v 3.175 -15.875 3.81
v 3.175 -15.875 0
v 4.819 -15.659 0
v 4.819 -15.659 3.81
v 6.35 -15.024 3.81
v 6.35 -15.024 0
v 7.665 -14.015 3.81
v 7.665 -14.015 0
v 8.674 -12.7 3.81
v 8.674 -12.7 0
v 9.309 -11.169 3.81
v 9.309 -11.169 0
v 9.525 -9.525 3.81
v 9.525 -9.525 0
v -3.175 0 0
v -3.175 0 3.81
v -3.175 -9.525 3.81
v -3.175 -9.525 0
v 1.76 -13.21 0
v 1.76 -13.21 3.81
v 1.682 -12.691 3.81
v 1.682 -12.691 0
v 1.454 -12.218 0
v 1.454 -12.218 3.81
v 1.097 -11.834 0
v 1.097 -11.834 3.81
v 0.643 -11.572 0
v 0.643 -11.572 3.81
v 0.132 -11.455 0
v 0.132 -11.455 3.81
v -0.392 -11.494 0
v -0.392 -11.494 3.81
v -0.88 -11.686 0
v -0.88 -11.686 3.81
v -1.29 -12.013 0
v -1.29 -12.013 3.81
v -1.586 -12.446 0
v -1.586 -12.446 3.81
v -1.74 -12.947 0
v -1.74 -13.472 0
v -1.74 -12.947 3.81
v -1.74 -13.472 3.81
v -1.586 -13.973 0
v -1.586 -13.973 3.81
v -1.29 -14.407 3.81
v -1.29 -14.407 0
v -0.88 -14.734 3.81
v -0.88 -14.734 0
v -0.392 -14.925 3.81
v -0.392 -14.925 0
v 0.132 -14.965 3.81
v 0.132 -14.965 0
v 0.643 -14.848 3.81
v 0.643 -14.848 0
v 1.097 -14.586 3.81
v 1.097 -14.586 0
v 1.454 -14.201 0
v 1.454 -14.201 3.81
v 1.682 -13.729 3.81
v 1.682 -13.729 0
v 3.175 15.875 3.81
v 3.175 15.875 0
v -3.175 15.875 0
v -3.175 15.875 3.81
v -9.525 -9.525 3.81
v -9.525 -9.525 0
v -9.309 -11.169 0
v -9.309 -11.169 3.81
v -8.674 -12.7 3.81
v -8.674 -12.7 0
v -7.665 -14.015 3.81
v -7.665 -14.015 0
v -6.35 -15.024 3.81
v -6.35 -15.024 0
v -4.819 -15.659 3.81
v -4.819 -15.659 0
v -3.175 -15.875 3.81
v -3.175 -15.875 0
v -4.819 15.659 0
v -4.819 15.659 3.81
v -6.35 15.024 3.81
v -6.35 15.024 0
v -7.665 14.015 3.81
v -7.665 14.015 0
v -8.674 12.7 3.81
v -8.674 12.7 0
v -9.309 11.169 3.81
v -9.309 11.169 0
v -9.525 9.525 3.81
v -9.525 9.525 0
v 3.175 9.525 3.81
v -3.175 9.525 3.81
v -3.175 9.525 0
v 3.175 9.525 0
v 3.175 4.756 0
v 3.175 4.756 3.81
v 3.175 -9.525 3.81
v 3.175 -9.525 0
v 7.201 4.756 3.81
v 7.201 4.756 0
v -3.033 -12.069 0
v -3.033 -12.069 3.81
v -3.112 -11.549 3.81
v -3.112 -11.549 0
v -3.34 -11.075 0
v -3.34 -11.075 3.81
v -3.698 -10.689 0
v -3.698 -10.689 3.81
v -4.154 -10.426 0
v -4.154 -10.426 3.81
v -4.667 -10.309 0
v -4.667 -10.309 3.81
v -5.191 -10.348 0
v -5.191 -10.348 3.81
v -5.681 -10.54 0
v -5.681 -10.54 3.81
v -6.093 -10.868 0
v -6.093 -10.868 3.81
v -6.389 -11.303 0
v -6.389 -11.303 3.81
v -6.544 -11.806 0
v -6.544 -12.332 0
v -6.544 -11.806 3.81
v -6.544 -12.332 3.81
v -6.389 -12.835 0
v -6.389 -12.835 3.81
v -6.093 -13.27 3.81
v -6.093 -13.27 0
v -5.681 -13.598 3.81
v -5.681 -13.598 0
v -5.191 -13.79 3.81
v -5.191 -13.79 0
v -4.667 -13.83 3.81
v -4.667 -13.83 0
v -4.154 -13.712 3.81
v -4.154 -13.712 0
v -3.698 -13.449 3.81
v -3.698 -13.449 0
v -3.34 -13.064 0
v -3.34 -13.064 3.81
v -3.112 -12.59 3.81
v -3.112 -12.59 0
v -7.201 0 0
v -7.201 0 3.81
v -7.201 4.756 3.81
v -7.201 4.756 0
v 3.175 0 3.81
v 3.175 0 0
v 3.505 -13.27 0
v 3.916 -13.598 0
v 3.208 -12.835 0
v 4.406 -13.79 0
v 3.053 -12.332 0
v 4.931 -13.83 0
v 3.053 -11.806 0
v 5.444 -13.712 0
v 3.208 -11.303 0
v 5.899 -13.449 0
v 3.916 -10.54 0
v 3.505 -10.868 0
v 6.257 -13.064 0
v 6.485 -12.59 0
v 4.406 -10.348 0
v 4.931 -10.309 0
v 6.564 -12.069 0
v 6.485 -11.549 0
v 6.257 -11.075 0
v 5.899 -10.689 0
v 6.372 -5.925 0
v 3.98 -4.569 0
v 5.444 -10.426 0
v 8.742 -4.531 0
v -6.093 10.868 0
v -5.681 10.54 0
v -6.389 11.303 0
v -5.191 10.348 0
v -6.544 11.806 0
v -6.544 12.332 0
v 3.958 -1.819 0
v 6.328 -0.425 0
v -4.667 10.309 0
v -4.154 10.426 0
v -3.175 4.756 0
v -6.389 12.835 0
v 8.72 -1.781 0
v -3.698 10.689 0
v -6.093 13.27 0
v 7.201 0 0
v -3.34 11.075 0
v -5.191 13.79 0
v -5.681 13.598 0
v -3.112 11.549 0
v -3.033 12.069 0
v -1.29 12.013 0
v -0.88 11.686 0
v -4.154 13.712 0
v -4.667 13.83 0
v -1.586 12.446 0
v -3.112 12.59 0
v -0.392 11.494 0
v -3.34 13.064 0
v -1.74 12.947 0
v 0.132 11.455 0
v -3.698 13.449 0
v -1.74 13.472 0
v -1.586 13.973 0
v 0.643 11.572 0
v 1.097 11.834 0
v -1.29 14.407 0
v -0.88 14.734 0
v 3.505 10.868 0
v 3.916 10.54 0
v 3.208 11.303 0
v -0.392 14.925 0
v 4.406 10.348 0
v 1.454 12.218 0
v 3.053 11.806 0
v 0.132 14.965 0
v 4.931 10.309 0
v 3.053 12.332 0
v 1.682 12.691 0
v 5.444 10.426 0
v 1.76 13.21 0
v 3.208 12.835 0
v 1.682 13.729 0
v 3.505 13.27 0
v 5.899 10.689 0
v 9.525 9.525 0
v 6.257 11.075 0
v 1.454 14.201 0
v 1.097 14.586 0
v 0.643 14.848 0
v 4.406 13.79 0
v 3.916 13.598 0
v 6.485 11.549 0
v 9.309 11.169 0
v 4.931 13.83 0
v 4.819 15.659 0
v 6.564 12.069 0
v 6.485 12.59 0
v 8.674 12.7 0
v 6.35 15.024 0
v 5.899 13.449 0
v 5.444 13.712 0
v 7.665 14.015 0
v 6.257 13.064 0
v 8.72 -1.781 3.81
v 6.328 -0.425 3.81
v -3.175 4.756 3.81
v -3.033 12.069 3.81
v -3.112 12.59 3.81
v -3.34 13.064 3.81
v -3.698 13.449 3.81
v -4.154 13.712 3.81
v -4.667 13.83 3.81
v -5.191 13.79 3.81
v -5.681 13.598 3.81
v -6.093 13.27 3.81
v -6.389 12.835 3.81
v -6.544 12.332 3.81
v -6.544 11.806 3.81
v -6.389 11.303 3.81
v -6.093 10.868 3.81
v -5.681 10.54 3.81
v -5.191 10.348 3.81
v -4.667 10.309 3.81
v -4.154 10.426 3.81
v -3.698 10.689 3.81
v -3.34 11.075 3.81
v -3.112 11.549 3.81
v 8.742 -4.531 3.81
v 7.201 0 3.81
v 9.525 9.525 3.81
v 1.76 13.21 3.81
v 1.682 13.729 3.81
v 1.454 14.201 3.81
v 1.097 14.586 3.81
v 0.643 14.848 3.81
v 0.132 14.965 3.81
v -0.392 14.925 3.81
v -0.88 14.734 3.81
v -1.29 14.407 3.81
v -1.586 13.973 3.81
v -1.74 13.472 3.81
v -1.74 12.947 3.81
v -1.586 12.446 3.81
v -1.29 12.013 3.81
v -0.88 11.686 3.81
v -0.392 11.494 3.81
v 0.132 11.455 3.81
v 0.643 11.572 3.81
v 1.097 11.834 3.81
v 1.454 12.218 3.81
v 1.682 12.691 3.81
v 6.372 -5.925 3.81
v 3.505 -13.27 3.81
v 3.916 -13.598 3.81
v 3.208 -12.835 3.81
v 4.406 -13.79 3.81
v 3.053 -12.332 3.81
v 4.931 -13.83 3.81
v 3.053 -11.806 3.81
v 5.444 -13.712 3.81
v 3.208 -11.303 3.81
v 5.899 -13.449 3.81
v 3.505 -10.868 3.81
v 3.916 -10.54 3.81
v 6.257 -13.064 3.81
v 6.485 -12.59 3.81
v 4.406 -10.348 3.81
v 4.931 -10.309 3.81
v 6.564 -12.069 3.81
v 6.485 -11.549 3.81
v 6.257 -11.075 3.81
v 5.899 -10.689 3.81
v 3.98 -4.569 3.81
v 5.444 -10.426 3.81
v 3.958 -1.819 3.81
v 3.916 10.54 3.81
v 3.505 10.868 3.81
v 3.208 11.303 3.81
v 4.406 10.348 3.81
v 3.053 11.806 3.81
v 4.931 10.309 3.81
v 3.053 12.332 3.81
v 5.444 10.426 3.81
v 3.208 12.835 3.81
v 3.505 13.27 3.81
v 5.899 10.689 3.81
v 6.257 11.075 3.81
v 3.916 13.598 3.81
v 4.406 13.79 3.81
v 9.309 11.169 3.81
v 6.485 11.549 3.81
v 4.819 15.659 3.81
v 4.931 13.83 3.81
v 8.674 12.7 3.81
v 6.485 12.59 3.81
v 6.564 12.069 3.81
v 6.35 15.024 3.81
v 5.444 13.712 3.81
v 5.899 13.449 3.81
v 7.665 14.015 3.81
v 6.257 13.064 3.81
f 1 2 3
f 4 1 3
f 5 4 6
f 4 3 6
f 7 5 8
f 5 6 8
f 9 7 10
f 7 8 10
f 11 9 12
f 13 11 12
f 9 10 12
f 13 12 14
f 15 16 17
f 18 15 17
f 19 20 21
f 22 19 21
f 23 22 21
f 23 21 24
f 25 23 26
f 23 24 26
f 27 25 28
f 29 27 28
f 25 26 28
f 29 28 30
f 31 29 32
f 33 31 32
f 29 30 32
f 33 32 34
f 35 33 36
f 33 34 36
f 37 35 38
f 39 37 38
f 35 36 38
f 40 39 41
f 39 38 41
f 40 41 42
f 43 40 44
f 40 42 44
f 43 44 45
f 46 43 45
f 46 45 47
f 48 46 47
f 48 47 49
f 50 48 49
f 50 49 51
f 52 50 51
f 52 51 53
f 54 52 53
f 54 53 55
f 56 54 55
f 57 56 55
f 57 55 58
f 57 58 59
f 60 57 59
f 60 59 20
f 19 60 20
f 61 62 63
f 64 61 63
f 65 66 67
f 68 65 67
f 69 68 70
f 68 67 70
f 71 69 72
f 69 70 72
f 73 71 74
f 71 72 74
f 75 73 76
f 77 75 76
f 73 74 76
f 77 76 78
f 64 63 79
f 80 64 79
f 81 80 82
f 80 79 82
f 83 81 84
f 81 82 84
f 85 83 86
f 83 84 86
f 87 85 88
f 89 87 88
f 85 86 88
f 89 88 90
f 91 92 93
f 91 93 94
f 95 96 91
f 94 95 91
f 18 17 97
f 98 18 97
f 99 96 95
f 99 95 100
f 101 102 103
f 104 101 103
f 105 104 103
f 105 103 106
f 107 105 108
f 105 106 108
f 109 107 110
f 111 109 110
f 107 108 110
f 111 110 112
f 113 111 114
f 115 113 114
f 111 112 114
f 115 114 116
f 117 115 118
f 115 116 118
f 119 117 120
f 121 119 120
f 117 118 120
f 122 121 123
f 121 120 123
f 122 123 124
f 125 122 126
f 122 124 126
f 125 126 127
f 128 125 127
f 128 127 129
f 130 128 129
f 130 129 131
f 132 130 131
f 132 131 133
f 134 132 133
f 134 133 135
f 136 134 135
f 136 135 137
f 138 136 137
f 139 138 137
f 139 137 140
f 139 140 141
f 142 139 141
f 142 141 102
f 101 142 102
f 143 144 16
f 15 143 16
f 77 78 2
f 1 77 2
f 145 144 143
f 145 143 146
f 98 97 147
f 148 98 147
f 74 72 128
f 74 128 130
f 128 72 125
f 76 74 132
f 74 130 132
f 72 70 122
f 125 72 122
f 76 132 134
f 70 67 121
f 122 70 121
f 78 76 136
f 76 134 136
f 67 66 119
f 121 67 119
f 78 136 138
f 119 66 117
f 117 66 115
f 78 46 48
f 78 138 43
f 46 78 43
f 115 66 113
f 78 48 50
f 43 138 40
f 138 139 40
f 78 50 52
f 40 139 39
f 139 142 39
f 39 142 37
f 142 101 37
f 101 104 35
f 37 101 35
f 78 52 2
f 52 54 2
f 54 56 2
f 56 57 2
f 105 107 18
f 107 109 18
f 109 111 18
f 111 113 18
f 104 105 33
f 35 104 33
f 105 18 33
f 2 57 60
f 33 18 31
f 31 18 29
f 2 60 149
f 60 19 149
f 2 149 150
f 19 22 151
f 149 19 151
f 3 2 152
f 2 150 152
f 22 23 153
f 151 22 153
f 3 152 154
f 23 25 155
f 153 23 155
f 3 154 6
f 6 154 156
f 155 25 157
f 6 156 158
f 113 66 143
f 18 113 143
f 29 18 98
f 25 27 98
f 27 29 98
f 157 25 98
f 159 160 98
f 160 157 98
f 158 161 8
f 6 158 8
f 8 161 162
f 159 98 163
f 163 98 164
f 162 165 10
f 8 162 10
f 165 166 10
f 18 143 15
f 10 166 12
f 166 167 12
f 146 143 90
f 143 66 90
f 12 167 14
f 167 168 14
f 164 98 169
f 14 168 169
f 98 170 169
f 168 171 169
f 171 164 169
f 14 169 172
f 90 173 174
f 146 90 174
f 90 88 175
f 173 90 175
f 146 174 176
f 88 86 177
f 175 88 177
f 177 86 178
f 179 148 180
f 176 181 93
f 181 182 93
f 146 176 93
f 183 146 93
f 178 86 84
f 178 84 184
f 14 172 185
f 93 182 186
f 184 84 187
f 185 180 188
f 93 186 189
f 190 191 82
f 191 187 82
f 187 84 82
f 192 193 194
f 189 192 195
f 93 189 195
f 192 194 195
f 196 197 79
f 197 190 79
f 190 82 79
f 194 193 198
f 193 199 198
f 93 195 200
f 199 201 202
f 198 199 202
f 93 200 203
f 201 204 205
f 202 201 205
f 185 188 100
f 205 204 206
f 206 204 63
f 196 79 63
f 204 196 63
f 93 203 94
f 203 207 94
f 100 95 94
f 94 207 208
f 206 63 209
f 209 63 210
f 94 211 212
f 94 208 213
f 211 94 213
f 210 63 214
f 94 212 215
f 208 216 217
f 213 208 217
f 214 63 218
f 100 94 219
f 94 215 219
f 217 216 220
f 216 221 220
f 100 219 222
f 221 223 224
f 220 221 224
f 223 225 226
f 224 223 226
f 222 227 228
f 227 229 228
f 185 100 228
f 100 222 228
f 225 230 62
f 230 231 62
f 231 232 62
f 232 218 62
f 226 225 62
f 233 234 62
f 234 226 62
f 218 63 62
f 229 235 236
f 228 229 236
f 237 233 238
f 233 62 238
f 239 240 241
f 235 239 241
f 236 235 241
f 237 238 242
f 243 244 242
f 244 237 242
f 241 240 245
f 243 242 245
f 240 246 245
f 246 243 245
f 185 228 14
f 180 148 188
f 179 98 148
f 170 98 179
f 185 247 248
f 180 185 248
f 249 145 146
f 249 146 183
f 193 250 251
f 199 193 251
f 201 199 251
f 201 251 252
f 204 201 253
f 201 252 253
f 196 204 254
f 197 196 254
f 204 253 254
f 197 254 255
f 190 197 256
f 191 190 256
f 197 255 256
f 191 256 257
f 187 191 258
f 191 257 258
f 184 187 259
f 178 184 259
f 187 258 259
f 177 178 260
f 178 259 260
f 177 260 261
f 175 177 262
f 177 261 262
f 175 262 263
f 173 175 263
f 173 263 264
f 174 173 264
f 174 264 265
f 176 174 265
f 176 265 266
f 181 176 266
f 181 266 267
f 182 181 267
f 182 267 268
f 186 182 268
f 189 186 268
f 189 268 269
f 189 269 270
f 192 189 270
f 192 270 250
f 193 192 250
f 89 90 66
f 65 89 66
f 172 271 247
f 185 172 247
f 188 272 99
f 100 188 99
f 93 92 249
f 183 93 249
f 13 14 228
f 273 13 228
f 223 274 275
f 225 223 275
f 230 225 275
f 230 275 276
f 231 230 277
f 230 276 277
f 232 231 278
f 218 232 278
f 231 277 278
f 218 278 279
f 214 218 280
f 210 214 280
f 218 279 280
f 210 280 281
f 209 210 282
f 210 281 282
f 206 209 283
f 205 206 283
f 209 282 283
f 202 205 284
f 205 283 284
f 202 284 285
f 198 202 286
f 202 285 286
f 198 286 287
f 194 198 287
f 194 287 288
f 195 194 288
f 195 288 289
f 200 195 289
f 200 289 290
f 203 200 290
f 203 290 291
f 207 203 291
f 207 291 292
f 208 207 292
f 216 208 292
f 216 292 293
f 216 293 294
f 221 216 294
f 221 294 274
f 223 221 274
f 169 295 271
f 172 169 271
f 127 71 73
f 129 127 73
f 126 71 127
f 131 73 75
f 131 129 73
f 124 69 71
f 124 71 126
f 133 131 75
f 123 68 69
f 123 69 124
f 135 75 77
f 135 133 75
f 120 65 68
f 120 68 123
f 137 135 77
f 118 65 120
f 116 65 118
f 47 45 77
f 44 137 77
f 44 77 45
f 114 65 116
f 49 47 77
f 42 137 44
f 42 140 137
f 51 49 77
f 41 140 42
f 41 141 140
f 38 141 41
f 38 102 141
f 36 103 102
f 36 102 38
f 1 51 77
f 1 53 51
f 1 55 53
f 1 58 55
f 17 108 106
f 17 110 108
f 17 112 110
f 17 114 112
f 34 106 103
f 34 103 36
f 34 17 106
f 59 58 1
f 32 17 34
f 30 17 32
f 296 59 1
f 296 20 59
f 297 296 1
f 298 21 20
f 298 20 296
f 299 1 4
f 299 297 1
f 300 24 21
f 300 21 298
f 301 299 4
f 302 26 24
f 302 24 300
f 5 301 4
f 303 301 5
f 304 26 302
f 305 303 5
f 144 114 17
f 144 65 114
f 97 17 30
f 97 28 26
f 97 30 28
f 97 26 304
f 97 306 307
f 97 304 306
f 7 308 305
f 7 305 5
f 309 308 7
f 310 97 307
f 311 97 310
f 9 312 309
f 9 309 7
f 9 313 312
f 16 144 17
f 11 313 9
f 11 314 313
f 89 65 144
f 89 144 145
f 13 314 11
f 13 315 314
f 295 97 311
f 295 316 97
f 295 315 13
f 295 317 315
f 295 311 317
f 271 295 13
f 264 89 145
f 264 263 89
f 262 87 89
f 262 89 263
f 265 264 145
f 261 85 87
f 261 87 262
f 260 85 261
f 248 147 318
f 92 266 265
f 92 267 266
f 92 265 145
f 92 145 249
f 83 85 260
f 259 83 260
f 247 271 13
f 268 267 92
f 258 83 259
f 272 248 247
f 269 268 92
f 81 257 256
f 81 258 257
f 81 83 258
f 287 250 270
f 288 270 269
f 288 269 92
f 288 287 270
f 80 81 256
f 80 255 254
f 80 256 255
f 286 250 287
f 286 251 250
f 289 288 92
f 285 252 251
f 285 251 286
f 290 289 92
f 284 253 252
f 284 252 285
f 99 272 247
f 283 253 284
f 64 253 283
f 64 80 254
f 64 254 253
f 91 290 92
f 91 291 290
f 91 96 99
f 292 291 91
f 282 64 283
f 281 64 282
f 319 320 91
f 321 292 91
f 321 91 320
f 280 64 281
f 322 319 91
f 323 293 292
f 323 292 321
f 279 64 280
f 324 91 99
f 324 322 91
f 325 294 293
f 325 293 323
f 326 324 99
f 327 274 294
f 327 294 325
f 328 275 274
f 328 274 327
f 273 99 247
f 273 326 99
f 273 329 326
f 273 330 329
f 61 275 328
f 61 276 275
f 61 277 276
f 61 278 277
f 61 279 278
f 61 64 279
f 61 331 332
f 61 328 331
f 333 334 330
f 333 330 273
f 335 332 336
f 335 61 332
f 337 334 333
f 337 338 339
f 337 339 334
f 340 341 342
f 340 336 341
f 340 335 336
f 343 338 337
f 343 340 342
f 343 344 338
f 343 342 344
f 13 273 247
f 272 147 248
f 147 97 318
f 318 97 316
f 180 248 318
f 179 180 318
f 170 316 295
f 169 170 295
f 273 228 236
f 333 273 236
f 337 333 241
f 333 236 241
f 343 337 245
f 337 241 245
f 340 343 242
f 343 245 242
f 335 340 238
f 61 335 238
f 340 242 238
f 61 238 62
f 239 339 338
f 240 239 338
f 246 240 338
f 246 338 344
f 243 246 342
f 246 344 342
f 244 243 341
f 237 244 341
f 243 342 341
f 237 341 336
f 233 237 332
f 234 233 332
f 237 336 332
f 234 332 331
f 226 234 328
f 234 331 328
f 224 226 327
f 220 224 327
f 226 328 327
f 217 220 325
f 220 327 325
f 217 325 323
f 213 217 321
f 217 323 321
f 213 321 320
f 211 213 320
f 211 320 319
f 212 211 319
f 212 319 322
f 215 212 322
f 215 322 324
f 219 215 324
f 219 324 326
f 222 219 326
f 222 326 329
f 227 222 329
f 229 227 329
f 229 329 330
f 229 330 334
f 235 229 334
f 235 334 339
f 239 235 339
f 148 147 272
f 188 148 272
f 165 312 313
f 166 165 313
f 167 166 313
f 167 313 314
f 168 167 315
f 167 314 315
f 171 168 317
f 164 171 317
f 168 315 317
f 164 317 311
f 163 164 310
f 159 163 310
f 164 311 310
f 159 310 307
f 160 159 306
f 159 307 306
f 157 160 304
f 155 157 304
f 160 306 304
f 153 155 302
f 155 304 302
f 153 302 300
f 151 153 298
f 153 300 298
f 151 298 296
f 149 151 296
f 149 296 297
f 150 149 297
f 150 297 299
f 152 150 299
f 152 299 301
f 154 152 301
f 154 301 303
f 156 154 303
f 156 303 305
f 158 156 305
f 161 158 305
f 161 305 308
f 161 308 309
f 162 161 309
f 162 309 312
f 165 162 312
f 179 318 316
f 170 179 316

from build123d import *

# Parameters (mm, degrees)
F1_DEPTH = 3.81
F2_W     = 6.35
F2_H     = 4.7692152426
F2_H_2   = 4.7557847574
F2_H_3   = 9.525
F2_W_2   = 4.0261267766
F3_DEPTH = 25.4
F4_R     = 1.7598288085
F4_R_2   = 1.7653
F5_DEPTH = 25.4
F7_DEPTH = 25.4


with BuildPart() as f1:
    # F0 (on Top) → F1 (new body)
    with BuildSketch(Plane.XY):
        with BuildLine():
            Line((-3.175, -15.875), (3.175, -15.875))
            ThreePointArc((3.175, -15.875), (7.6651280605, -14.0151280605), (9.525, -9.525))
            Line((9.525, -9.525), (9.525, 9.525))
            ThreePointArc((9.525, 9.525), (7.6651280605, 14.0151280605), (3.175, 15.875))
            Line((3.175, 15.875), (-3.175, 15.875))
            ThreePointArc((-3.175, 15.875), (-7.6651280605, 14.0151280605), (-9.525, 9.525))
            Line((-9.525, 9.525), (-9.525, -9.525))
            ThreePointArc((-9.525, -9.525), (-7.6651280605, -14.0151280605), (-3.175, -15.875))
        make_face()
    extrude(amount=F1_DEPTH)

    # F2 (on face) → F3 (cut)
    with BuildSketch(Plane.XY.offset(3.81)):
        with Locations((0, 7.1403923787)):
            Rectangle(F2_W, F2_H)
        with Locations((0, 2.3778923787)):
            Rectangle(F2_W, F2_H_2)
        with Locations((0, -4.7625)):
            Rectangle(F2_W, F2_H_3)
        with Locations((-5.1880633883, 2.3778923787)):
            Rectangle(F2_W_2, F2_H_2)
        with Locations((5.1880633883, 2.3778923787)):
            Rectangle(F2_W_2, F2_H_2)
    extrude(amount=-F3_DEPTH, mode=Mode.SUBTRACT)

    # F4 (on face) → F5 (cut)
    with BuildSketch(Plane.XY.offset(3.81)):
        with Locations((0, 13.2097881287)):
            Circle(F4_R)
        with Locations((4.7985878773, 12.0691694319)):
            Circle(F4_R_2)
        with Locations((-4.7985878773, 12.0691694319)):
            Circle(F4_R_2)
        with Locations((-4.7985878773, -12.0691694319)):
            Circle(F4_R_2)
        with Locations((0, -13.2097881287)):
            Circle(F4_R)
        with Locations((4.7985878773, -12.0691694319)):
            Circle(F4_R_2)
    extrude(amount=-F5_DEPTH, mode=Mode.SUBTRACT)

    # F6 (on face) → F7 (cut)
    with BuildSketch(Plane.XY.offset(3.81)):
        Polygon((6.372133691, -5.9245415708), (8.7422396946, -4.5306024468), (8.7201060036, -1.7810608759), (6.327866309, -0.4254584292), (3.9577603054, -1.8193975532), (3.9798939964, -4.5689391241), align=None)
    extrude(amount=-F7_DEPTH, mode=Mode.SUBTRACT)


solid = f1.part
